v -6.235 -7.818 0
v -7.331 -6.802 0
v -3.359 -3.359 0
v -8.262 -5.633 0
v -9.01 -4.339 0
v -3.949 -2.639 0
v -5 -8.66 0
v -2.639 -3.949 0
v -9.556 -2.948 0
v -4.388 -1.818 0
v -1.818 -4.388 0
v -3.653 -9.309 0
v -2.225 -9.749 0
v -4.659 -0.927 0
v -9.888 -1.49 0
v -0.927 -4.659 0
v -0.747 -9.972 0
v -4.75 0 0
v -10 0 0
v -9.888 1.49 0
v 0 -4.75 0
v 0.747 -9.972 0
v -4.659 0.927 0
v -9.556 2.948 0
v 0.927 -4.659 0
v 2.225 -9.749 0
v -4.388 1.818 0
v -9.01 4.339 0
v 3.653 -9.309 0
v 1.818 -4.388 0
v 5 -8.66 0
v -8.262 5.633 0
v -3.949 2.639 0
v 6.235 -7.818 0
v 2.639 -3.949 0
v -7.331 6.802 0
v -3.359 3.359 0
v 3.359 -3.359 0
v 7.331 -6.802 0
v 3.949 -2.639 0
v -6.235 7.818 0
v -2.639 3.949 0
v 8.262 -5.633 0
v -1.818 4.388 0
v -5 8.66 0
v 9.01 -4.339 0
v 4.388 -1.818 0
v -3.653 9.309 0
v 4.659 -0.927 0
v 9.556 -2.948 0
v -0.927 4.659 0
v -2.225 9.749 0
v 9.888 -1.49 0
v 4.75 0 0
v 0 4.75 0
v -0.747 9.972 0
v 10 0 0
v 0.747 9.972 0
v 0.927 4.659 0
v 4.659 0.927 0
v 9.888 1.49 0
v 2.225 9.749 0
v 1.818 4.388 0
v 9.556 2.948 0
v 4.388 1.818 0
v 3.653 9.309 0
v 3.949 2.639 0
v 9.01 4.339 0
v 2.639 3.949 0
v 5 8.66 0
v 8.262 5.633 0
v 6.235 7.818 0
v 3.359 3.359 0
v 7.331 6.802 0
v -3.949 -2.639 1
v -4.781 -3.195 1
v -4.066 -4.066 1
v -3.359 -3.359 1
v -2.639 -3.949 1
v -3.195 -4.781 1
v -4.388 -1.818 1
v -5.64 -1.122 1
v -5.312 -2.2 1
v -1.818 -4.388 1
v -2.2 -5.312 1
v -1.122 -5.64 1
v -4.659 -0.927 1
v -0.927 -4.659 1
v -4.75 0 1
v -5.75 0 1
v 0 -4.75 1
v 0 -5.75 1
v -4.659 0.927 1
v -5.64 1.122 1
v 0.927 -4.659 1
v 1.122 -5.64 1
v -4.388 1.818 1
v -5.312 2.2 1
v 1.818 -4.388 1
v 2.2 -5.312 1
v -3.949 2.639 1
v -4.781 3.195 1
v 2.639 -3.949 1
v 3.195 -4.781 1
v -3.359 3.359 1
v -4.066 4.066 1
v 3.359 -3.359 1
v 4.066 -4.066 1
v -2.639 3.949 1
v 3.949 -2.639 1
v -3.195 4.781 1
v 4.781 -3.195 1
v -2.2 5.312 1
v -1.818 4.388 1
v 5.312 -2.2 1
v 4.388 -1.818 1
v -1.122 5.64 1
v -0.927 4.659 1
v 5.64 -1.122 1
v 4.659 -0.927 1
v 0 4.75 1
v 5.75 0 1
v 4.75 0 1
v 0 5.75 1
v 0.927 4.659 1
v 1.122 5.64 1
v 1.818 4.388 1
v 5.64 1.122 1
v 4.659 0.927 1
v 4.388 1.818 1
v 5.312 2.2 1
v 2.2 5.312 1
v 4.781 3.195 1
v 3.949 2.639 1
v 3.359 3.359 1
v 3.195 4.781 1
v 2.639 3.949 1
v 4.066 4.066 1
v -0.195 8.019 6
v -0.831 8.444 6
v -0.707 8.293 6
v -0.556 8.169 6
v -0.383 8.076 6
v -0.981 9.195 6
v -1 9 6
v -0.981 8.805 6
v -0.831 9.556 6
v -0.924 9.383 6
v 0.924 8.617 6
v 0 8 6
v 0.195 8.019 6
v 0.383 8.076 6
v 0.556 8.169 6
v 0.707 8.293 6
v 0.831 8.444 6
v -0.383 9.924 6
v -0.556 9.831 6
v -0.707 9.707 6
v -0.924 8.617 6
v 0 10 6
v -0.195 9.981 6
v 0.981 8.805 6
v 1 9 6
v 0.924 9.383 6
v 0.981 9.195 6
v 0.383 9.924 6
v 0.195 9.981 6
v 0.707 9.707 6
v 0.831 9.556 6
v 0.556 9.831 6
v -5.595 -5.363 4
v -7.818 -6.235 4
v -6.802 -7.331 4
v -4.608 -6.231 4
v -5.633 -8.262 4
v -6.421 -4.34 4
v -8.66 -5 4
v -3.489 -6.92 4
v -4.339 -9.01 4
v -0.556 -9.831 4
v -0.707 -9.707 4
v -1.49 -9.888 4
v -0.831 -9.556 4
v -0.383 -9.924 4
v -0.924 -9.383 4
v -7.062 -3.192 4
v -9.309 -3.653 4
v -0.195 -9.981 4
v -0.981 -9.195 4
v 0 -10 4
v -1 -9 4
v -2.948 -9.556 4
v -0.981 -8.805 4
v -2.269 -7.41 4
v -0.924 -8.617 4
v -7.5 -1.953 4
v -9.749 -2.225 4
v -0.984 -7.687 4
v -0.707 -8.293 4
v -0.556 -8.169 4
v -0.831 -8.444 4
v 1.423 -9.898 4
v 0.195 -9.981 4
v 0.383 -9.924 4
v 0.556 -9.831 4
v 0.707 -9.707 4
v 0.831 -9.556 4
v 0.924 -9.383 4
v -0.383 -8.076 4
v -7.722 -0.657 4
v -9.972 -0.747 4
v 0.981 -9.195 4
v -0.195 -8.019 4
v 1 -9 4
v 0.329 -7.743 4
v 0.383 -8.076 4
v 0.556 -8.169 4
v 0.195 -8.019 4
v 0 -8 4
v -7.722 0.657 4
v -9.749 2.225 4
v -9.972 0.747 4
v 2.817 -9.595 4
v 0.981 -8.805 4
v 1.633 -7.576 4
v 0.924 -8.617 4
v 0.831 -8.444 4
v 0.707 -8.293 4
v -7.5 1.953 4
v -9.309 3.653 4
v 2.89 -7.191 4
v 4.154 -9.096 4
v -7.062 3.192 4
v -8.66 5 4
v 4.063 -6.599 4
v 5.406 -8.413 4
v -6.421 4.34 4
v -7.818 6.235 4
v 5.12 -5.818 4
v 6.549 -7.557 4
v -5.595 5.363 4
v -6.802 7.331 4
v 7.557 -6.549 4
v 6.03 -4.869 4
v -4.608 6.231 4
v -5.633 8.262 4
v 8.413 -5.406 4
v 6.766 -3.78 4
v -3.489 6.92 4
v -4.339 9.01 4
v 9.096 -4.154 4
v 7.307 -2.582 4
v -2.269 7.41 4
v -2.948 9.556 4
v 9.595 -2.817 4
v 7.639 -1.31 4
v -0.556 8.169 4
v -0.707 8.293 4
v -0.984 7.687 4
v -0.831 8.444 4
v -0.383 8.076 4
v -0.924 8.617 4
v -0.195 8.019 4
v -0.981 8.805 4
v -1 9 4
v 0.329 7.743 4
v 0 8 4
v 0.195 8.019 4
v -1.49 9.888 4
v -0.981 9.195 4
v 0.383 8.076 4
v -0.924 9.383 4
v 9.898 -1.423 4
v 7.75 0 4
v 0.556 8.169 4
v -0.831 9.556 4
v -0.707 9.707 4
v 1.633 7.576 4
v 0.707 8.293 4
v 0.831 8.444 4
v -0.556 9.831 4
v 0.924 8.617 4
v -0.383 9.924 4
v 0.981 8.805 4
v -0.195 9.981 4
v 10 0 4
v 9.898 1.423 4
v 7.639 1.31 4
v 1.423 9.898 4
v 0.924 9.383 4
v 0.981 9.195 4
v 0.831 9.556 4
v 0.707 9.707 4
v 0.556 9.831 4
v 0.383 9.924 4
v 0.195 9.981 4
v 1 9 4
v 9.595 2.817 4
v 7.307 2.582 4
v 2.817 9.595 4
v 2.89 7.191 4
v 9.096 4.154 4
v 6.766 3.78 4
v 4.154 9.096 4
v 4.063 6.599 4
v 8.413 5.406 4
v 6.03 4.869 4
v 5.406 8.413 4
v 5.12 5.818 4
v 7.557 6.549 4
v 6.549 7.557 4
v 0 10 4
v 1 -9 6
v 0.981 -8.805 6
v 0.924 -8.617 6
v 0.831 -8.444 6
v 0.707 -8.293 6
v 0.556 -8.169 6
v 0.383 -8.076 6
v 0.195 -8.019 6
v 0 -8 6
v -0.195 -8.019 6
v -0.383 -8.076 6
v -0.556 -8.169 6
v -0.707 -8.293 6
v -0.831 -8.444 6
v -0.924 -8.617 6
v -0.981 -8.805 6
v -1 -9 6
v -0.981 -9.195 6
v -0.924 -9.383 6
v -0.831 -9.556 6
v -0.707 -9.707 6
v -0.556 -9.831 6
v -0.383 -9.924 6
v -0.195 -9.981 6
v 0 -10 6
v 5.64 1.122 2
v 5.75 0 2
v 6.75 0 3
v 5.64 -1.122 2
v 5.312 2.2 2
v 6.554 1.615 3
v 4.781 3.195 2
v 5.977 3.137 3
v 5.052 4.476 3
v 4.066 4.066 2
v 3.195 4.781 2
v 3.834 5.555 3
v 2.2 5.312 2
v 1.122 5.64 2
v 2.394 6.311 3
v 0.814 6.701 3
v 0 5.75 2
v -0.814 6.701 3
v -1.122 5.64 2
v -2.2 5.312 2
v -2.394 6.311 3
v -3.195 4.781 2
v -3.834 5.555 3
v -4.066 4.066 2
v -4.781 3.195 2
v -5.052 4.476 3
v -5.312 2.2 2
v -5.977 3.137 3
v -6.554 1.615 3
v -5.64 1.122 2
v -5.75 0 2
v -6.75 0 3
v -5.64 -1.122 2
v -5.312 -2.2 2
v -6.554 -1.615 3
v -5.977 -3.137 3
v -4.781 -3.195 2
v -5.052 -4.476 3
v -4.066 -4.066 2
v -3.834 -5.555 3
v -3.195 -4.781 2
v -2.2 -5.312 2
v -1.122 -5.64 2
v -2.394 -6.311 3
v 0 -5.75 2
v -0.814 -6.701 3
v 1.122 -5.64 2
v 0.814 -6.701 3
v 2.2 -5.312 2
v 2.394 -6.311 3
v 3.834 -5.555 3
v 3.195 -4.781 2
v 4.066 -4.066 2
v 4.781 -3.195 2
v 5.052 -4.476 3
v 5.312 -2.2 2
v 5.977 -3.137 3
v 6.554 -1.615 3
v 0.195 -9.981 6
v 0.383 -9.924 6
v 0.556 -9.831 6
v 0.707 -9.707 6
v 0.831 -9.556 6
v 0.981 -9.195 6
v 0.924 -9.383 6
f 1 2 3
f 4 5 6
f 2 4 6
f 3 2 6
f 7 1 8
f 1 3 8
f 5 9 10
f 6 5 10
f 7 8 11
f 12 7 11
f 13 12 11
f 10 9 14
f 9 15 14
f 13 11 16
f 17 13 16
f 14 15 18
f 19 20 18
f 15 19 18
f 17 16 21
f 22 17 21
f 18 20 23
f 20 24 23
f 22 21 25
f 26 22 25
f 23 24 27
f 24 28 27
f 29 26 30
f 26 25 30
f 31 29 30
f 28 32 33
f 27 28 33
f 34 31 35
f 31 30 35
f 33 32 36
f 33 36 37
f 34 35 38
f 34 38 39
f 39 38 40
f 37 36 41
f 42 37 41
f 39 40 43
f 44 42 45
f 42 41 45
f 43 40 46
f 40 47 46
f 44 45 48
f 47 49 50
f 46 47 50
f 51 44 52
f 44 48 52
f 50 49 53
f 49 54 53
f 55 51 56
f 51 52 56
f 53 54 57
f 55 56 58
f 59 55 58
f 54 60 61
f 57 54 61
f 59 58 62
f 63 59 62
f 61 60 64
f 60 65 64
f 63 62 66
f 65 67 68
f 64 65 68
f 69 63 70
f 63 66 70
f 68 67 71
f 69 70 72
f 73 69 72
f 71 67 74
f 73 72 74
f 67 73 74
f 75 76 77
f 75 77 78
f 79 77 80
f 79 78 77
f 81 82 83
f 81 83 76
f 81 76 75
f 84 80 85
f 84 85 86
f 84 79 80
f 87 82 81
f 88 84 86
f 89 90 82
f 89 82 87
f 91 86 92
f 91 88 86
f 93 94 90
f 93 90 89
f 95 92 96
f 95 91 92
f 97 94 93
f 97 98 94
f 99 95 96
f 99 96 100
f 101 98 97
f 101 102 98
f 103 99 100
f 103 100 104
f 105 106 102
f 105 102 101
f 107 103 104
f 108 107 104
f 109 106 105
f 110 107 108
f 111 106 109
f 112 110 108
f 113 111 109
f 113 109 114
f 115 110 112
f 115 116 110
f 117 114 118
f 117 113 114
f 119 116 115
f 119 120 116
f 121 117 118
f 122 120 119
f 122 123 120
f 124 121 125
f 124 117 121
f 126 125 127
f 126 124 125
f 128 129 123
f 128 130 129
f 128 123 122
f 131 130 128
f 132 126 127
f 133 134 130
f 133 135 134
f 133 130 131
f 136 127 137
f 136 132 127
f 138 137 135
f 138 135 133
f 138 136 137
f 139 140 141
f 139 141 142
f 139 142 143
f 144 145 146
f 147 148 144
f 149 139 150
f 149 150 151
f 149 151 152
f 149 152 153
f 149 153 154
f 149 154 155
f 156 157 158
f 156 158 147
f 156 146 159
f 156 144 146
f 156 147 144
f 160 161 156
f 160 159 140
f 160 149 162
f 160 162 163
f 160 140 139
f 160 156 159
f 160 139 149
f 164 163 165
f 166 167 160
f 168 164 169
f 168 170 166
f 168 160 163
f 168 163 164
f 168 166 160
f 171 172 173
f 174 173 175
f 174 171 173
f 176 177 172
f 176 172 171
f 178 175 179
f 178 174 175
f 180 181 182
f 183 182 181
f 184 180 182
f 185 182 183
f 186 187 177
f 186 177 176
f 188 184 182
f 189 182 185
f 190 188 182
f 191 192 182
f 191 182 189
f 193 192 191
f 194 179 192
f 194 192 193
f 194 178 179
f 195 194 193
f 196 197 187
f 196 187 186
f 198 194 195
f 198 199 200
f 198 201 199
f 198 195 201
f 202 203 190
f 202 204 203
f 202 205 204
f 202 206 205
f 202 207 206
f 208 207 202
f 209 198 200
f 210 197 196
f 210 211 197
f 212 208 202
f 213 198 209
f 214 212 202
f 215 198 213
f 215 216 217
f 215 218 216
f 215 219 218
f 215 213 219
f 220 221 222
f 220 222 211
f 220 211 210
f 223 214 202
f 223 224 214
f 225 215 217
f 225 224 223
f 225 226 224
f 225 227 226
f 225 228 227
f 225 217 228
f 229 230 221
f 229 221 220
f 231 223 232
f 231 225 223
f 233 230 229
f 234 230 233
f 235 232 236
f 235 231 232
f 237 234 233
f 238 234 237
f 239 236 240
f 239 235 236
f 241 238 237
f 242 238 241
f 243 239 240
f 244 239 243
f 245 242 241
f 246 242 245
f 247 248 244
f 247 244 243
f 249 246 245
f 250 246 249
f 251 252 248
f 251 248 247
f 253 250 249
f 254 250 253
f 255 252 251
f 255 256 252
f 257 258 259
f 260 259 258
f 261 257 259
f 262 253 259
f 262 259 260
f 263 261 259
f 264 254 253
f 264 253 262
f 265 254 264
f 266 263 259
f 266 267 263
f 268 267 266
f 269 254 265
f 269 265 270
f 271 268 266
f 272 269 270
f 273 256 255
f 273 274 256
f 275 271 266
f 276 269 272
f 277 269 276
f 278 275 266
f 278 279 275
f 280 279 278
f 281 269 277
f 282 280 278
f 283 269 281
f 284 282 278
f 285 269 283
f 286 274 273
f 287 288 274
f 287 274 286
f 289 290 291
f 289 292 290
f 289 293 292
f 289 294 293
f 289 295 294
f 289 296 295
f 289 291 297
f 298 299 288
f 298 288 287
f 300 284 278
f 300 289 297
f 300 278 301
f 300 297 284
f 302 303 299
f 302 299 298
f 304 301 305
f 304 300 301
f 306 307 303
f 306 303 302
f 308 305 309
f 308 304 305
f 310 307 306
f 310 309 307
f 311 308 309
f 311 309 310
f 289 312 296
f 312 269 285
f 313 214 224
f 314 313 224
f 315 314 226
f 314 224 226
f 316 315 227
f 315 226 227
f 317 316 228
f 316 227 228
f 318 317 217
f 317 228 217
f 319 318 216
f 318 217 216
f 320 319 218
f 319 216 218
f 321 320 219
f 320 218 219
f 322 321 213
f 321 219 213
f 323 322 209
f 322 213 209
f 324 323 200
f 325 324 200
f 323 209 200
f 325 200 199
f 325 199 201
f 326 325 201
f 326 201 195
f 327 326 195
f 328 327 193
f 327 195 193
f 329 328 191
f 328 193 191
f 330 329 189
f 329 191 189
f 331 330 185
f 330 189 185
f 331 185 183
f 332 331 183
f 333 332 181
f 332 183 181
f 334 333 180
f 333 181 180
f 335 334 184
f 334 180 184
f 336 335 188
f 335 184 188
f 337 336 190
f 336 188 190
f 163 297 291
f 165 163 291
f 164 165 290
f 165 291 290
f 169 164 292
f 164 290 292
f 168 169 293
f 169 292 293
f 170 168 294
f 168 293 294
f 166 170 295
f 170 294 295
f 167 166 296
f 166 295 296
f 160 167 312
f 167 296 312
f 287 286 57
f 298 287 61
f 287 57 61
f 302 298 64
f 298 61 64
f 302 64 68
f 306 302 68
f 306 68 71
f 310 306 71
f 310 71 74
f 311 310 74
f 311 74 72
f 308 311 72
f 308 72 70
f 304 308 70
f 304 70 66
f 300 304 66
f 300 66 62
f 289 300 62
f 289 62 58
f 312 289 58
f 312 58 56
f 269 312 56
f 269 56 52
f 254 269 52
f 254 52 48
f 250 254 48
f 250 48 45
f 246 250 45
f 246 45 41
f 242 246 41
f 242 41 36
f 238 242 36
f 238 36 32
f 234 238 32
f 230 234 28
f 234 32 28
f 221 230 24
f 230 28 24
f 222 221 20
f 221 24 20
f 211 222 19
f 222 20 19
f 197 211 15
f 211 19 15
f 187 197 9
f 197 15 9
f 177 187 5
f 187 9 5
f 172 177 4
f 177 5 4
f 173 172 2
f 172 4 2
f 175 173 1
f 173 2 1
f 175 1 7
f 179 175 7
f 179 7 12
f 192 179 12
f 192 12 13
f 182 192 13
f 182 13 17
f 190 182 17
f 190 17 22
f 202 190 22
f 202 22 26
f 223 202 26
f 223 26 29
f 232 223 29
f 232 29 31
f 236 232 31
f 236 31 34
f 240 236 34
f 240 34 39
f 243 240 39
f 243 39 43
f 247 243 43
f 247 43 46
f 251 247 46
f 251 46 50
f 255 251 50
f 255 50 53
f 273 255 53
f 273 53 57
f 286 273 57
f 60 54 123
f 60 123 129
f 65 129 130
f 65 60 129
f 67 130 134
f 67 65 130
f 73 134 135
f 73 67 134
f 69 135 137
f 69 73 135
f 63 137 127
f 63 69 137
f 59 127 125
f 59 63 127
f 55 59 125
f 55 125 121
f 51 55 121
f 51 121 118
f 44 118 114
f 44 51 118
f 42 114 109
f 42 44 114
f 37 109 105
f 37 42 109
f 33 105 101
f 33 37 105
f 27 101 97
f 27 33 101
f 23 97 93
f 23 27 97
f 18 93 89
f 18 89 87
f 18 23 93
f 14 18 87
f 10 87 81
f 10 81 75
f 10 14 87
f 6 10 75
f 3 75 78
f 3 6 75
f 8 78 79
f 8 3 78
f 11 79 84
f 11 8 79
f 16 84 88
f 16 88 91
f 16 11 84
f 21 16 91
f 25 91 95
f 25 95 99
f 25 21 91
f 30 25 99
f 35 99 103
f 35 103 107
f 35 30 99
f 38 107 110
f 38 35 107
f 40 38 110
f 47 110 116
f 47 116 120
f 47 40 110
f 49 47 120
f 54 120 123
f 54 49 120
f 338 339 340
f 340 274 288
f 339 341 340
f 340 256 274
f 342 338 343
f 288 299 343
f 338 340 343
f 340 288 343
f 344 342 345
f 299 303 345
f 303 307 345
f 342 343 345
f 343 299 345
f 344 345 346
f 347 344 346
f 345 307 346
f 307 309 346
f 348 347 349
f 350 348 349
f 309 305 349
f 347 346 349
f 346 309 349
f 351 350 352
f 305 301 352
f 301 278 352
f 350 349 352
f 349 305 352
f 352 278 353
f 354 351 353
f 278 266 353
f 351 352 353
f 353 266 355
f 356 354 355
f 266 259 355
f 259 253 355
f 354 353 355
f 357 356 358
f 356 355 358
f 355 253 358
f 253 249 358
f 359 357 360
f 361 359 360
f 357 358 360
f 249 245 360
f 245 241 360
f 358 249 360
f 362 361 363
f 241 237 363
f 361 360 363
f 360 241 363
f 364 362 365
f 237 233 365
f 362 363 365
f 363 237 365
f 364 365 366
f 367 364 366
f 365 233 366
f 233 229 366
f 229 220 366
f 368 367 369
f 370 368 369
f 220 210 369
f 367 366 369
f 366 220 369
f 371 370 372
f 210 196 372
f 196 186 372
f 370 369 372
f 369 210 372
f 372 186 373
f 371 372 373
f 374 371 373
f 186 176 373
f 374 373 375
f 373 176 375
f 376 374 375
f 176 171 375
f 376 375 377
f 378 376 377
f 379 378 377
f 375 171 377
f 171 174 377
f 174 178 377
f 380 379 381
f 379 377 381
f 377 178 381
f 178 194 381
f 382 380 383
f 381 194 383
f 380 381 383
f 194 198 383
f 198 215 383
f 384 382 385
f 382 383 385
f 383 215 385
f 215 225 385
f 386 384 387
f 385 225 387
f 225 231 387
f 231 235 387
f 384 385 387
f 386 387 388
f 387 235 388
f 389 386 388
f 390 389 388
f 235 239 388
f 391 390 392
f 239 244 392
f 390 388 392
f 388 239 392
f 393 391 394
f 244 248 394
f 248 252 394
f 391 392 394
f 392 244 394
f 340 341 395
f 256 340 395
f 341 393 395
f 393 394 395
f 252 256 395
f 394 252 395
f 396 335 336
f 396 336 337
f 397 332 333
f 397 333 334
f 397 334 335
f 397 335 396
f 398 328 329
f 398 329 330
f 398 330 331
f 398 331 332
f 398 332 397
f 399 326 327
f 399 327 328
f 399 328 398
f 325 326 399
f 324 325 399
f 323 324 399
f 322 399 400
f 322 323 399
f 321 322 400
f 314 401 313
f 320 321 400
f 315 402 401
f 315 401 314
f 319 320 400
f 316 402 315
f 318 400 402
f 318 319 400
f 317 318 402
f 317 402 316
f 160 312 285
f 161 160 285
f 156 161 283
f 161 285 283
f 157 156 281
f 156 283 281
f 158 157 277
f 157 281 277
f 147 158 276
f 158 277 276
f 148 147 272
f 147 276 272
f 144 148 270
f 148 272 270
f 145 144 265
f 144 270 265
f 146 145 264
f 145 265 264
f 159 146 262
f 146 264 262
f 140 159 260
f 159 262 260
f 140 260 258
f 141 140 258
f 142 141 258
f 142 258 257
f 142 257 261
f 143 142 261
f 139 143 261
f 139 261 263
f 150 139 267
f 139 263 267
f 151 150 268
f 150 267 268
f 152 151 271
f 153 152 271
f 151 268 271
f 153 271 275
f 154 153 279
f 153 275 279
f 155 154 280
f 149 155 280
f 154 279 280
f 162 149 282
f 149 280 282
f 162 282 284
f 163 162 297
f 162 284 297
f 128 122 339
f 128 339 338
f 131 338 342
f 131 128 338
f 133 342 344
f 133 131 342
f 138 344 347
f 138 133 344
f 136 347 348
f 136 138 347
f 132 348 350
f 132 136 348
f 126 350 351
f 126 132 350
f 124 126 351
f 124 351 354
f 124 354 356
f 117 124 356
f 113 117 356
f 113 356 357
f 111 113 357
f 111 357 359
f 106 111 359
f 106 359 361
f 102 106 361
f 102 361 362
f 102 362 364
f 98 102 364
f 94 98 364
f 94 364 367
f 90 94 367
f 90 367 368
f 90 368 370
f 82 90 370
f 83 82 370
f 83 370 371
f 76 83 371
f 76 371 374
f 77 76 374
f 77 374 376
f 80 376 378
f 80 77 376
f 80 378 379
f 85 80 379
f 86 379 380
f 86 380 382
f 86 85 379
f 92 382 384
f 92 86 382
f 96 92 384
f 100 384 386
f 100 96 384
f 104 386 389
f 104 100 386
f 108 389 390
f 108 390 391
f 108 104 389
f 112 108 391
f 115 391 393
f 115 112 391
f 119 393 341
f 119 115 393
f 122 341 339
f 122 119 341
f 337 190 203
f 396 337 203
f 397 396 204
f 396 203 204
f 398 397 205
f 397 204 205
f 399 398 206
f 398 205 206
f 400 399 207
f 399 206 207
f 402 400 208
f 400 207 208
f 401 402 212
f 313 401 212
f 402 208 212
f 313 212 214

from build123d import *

# Parameters (mm, degrees)
F0_R     = 10
F0_R_2   = 5.75
F1_DEPTH = 4
F0_R_3   = 4.75
F2_DEPTH = 1
F3_SIZE  = 2
F5_DEPTH = 2


# Not quite as in the source:
# - a feature names something its author has since deleted; it is built from what else it names


with BuildPart() as f1:
    # F0 (on Top) → F1 (new body)
    with BuildSketch(Plane.XY):
        Circle(F0_R)
        Circle(F0_R_2, mode=Mode.SUBTRACT)
    extrude(amount=F1_DEPTH)

    # F0 (on Top) → F2 (join)
    with BuildSketch(Plane.XY):
        Circle(F0_R_2)
        Circle(F0_R_3, mode=Mode.SUBTRACT)
    extrude(amount=F2_DEPTH)

    # F3
    f3_edges = [f1.edges().sort_by_distance(p)[0] for p in [
        (-5.75, 0, 4),
    ]]
    chamfer(f3_edges, length=F3_SIZE)

    # F4 (on face) → F5 (join)
    with BuildSketch(Plane.XY.offset(4)):
        with BuildLine():
            ThreePointArc((4.5e-09, 10), (-0.7071067828, 8.2928932204), (1, 9))
            ThreePointArc((1, 9), (0.7071067828, 9.7071067796), (4.5e-09, 10))
        make_face()
        with BuildLine():
            ThreePointArc((1, -9), (-0.7071067792, -8.2928932169), (-5.5e-09, -10))
            ThreePointArc((-5.5e-09, -10), (0.7071067792, -9.7071067831), (1, -9))
        make_face()
    extrude(amount=F5_DEPTH)


solid = f1.part
